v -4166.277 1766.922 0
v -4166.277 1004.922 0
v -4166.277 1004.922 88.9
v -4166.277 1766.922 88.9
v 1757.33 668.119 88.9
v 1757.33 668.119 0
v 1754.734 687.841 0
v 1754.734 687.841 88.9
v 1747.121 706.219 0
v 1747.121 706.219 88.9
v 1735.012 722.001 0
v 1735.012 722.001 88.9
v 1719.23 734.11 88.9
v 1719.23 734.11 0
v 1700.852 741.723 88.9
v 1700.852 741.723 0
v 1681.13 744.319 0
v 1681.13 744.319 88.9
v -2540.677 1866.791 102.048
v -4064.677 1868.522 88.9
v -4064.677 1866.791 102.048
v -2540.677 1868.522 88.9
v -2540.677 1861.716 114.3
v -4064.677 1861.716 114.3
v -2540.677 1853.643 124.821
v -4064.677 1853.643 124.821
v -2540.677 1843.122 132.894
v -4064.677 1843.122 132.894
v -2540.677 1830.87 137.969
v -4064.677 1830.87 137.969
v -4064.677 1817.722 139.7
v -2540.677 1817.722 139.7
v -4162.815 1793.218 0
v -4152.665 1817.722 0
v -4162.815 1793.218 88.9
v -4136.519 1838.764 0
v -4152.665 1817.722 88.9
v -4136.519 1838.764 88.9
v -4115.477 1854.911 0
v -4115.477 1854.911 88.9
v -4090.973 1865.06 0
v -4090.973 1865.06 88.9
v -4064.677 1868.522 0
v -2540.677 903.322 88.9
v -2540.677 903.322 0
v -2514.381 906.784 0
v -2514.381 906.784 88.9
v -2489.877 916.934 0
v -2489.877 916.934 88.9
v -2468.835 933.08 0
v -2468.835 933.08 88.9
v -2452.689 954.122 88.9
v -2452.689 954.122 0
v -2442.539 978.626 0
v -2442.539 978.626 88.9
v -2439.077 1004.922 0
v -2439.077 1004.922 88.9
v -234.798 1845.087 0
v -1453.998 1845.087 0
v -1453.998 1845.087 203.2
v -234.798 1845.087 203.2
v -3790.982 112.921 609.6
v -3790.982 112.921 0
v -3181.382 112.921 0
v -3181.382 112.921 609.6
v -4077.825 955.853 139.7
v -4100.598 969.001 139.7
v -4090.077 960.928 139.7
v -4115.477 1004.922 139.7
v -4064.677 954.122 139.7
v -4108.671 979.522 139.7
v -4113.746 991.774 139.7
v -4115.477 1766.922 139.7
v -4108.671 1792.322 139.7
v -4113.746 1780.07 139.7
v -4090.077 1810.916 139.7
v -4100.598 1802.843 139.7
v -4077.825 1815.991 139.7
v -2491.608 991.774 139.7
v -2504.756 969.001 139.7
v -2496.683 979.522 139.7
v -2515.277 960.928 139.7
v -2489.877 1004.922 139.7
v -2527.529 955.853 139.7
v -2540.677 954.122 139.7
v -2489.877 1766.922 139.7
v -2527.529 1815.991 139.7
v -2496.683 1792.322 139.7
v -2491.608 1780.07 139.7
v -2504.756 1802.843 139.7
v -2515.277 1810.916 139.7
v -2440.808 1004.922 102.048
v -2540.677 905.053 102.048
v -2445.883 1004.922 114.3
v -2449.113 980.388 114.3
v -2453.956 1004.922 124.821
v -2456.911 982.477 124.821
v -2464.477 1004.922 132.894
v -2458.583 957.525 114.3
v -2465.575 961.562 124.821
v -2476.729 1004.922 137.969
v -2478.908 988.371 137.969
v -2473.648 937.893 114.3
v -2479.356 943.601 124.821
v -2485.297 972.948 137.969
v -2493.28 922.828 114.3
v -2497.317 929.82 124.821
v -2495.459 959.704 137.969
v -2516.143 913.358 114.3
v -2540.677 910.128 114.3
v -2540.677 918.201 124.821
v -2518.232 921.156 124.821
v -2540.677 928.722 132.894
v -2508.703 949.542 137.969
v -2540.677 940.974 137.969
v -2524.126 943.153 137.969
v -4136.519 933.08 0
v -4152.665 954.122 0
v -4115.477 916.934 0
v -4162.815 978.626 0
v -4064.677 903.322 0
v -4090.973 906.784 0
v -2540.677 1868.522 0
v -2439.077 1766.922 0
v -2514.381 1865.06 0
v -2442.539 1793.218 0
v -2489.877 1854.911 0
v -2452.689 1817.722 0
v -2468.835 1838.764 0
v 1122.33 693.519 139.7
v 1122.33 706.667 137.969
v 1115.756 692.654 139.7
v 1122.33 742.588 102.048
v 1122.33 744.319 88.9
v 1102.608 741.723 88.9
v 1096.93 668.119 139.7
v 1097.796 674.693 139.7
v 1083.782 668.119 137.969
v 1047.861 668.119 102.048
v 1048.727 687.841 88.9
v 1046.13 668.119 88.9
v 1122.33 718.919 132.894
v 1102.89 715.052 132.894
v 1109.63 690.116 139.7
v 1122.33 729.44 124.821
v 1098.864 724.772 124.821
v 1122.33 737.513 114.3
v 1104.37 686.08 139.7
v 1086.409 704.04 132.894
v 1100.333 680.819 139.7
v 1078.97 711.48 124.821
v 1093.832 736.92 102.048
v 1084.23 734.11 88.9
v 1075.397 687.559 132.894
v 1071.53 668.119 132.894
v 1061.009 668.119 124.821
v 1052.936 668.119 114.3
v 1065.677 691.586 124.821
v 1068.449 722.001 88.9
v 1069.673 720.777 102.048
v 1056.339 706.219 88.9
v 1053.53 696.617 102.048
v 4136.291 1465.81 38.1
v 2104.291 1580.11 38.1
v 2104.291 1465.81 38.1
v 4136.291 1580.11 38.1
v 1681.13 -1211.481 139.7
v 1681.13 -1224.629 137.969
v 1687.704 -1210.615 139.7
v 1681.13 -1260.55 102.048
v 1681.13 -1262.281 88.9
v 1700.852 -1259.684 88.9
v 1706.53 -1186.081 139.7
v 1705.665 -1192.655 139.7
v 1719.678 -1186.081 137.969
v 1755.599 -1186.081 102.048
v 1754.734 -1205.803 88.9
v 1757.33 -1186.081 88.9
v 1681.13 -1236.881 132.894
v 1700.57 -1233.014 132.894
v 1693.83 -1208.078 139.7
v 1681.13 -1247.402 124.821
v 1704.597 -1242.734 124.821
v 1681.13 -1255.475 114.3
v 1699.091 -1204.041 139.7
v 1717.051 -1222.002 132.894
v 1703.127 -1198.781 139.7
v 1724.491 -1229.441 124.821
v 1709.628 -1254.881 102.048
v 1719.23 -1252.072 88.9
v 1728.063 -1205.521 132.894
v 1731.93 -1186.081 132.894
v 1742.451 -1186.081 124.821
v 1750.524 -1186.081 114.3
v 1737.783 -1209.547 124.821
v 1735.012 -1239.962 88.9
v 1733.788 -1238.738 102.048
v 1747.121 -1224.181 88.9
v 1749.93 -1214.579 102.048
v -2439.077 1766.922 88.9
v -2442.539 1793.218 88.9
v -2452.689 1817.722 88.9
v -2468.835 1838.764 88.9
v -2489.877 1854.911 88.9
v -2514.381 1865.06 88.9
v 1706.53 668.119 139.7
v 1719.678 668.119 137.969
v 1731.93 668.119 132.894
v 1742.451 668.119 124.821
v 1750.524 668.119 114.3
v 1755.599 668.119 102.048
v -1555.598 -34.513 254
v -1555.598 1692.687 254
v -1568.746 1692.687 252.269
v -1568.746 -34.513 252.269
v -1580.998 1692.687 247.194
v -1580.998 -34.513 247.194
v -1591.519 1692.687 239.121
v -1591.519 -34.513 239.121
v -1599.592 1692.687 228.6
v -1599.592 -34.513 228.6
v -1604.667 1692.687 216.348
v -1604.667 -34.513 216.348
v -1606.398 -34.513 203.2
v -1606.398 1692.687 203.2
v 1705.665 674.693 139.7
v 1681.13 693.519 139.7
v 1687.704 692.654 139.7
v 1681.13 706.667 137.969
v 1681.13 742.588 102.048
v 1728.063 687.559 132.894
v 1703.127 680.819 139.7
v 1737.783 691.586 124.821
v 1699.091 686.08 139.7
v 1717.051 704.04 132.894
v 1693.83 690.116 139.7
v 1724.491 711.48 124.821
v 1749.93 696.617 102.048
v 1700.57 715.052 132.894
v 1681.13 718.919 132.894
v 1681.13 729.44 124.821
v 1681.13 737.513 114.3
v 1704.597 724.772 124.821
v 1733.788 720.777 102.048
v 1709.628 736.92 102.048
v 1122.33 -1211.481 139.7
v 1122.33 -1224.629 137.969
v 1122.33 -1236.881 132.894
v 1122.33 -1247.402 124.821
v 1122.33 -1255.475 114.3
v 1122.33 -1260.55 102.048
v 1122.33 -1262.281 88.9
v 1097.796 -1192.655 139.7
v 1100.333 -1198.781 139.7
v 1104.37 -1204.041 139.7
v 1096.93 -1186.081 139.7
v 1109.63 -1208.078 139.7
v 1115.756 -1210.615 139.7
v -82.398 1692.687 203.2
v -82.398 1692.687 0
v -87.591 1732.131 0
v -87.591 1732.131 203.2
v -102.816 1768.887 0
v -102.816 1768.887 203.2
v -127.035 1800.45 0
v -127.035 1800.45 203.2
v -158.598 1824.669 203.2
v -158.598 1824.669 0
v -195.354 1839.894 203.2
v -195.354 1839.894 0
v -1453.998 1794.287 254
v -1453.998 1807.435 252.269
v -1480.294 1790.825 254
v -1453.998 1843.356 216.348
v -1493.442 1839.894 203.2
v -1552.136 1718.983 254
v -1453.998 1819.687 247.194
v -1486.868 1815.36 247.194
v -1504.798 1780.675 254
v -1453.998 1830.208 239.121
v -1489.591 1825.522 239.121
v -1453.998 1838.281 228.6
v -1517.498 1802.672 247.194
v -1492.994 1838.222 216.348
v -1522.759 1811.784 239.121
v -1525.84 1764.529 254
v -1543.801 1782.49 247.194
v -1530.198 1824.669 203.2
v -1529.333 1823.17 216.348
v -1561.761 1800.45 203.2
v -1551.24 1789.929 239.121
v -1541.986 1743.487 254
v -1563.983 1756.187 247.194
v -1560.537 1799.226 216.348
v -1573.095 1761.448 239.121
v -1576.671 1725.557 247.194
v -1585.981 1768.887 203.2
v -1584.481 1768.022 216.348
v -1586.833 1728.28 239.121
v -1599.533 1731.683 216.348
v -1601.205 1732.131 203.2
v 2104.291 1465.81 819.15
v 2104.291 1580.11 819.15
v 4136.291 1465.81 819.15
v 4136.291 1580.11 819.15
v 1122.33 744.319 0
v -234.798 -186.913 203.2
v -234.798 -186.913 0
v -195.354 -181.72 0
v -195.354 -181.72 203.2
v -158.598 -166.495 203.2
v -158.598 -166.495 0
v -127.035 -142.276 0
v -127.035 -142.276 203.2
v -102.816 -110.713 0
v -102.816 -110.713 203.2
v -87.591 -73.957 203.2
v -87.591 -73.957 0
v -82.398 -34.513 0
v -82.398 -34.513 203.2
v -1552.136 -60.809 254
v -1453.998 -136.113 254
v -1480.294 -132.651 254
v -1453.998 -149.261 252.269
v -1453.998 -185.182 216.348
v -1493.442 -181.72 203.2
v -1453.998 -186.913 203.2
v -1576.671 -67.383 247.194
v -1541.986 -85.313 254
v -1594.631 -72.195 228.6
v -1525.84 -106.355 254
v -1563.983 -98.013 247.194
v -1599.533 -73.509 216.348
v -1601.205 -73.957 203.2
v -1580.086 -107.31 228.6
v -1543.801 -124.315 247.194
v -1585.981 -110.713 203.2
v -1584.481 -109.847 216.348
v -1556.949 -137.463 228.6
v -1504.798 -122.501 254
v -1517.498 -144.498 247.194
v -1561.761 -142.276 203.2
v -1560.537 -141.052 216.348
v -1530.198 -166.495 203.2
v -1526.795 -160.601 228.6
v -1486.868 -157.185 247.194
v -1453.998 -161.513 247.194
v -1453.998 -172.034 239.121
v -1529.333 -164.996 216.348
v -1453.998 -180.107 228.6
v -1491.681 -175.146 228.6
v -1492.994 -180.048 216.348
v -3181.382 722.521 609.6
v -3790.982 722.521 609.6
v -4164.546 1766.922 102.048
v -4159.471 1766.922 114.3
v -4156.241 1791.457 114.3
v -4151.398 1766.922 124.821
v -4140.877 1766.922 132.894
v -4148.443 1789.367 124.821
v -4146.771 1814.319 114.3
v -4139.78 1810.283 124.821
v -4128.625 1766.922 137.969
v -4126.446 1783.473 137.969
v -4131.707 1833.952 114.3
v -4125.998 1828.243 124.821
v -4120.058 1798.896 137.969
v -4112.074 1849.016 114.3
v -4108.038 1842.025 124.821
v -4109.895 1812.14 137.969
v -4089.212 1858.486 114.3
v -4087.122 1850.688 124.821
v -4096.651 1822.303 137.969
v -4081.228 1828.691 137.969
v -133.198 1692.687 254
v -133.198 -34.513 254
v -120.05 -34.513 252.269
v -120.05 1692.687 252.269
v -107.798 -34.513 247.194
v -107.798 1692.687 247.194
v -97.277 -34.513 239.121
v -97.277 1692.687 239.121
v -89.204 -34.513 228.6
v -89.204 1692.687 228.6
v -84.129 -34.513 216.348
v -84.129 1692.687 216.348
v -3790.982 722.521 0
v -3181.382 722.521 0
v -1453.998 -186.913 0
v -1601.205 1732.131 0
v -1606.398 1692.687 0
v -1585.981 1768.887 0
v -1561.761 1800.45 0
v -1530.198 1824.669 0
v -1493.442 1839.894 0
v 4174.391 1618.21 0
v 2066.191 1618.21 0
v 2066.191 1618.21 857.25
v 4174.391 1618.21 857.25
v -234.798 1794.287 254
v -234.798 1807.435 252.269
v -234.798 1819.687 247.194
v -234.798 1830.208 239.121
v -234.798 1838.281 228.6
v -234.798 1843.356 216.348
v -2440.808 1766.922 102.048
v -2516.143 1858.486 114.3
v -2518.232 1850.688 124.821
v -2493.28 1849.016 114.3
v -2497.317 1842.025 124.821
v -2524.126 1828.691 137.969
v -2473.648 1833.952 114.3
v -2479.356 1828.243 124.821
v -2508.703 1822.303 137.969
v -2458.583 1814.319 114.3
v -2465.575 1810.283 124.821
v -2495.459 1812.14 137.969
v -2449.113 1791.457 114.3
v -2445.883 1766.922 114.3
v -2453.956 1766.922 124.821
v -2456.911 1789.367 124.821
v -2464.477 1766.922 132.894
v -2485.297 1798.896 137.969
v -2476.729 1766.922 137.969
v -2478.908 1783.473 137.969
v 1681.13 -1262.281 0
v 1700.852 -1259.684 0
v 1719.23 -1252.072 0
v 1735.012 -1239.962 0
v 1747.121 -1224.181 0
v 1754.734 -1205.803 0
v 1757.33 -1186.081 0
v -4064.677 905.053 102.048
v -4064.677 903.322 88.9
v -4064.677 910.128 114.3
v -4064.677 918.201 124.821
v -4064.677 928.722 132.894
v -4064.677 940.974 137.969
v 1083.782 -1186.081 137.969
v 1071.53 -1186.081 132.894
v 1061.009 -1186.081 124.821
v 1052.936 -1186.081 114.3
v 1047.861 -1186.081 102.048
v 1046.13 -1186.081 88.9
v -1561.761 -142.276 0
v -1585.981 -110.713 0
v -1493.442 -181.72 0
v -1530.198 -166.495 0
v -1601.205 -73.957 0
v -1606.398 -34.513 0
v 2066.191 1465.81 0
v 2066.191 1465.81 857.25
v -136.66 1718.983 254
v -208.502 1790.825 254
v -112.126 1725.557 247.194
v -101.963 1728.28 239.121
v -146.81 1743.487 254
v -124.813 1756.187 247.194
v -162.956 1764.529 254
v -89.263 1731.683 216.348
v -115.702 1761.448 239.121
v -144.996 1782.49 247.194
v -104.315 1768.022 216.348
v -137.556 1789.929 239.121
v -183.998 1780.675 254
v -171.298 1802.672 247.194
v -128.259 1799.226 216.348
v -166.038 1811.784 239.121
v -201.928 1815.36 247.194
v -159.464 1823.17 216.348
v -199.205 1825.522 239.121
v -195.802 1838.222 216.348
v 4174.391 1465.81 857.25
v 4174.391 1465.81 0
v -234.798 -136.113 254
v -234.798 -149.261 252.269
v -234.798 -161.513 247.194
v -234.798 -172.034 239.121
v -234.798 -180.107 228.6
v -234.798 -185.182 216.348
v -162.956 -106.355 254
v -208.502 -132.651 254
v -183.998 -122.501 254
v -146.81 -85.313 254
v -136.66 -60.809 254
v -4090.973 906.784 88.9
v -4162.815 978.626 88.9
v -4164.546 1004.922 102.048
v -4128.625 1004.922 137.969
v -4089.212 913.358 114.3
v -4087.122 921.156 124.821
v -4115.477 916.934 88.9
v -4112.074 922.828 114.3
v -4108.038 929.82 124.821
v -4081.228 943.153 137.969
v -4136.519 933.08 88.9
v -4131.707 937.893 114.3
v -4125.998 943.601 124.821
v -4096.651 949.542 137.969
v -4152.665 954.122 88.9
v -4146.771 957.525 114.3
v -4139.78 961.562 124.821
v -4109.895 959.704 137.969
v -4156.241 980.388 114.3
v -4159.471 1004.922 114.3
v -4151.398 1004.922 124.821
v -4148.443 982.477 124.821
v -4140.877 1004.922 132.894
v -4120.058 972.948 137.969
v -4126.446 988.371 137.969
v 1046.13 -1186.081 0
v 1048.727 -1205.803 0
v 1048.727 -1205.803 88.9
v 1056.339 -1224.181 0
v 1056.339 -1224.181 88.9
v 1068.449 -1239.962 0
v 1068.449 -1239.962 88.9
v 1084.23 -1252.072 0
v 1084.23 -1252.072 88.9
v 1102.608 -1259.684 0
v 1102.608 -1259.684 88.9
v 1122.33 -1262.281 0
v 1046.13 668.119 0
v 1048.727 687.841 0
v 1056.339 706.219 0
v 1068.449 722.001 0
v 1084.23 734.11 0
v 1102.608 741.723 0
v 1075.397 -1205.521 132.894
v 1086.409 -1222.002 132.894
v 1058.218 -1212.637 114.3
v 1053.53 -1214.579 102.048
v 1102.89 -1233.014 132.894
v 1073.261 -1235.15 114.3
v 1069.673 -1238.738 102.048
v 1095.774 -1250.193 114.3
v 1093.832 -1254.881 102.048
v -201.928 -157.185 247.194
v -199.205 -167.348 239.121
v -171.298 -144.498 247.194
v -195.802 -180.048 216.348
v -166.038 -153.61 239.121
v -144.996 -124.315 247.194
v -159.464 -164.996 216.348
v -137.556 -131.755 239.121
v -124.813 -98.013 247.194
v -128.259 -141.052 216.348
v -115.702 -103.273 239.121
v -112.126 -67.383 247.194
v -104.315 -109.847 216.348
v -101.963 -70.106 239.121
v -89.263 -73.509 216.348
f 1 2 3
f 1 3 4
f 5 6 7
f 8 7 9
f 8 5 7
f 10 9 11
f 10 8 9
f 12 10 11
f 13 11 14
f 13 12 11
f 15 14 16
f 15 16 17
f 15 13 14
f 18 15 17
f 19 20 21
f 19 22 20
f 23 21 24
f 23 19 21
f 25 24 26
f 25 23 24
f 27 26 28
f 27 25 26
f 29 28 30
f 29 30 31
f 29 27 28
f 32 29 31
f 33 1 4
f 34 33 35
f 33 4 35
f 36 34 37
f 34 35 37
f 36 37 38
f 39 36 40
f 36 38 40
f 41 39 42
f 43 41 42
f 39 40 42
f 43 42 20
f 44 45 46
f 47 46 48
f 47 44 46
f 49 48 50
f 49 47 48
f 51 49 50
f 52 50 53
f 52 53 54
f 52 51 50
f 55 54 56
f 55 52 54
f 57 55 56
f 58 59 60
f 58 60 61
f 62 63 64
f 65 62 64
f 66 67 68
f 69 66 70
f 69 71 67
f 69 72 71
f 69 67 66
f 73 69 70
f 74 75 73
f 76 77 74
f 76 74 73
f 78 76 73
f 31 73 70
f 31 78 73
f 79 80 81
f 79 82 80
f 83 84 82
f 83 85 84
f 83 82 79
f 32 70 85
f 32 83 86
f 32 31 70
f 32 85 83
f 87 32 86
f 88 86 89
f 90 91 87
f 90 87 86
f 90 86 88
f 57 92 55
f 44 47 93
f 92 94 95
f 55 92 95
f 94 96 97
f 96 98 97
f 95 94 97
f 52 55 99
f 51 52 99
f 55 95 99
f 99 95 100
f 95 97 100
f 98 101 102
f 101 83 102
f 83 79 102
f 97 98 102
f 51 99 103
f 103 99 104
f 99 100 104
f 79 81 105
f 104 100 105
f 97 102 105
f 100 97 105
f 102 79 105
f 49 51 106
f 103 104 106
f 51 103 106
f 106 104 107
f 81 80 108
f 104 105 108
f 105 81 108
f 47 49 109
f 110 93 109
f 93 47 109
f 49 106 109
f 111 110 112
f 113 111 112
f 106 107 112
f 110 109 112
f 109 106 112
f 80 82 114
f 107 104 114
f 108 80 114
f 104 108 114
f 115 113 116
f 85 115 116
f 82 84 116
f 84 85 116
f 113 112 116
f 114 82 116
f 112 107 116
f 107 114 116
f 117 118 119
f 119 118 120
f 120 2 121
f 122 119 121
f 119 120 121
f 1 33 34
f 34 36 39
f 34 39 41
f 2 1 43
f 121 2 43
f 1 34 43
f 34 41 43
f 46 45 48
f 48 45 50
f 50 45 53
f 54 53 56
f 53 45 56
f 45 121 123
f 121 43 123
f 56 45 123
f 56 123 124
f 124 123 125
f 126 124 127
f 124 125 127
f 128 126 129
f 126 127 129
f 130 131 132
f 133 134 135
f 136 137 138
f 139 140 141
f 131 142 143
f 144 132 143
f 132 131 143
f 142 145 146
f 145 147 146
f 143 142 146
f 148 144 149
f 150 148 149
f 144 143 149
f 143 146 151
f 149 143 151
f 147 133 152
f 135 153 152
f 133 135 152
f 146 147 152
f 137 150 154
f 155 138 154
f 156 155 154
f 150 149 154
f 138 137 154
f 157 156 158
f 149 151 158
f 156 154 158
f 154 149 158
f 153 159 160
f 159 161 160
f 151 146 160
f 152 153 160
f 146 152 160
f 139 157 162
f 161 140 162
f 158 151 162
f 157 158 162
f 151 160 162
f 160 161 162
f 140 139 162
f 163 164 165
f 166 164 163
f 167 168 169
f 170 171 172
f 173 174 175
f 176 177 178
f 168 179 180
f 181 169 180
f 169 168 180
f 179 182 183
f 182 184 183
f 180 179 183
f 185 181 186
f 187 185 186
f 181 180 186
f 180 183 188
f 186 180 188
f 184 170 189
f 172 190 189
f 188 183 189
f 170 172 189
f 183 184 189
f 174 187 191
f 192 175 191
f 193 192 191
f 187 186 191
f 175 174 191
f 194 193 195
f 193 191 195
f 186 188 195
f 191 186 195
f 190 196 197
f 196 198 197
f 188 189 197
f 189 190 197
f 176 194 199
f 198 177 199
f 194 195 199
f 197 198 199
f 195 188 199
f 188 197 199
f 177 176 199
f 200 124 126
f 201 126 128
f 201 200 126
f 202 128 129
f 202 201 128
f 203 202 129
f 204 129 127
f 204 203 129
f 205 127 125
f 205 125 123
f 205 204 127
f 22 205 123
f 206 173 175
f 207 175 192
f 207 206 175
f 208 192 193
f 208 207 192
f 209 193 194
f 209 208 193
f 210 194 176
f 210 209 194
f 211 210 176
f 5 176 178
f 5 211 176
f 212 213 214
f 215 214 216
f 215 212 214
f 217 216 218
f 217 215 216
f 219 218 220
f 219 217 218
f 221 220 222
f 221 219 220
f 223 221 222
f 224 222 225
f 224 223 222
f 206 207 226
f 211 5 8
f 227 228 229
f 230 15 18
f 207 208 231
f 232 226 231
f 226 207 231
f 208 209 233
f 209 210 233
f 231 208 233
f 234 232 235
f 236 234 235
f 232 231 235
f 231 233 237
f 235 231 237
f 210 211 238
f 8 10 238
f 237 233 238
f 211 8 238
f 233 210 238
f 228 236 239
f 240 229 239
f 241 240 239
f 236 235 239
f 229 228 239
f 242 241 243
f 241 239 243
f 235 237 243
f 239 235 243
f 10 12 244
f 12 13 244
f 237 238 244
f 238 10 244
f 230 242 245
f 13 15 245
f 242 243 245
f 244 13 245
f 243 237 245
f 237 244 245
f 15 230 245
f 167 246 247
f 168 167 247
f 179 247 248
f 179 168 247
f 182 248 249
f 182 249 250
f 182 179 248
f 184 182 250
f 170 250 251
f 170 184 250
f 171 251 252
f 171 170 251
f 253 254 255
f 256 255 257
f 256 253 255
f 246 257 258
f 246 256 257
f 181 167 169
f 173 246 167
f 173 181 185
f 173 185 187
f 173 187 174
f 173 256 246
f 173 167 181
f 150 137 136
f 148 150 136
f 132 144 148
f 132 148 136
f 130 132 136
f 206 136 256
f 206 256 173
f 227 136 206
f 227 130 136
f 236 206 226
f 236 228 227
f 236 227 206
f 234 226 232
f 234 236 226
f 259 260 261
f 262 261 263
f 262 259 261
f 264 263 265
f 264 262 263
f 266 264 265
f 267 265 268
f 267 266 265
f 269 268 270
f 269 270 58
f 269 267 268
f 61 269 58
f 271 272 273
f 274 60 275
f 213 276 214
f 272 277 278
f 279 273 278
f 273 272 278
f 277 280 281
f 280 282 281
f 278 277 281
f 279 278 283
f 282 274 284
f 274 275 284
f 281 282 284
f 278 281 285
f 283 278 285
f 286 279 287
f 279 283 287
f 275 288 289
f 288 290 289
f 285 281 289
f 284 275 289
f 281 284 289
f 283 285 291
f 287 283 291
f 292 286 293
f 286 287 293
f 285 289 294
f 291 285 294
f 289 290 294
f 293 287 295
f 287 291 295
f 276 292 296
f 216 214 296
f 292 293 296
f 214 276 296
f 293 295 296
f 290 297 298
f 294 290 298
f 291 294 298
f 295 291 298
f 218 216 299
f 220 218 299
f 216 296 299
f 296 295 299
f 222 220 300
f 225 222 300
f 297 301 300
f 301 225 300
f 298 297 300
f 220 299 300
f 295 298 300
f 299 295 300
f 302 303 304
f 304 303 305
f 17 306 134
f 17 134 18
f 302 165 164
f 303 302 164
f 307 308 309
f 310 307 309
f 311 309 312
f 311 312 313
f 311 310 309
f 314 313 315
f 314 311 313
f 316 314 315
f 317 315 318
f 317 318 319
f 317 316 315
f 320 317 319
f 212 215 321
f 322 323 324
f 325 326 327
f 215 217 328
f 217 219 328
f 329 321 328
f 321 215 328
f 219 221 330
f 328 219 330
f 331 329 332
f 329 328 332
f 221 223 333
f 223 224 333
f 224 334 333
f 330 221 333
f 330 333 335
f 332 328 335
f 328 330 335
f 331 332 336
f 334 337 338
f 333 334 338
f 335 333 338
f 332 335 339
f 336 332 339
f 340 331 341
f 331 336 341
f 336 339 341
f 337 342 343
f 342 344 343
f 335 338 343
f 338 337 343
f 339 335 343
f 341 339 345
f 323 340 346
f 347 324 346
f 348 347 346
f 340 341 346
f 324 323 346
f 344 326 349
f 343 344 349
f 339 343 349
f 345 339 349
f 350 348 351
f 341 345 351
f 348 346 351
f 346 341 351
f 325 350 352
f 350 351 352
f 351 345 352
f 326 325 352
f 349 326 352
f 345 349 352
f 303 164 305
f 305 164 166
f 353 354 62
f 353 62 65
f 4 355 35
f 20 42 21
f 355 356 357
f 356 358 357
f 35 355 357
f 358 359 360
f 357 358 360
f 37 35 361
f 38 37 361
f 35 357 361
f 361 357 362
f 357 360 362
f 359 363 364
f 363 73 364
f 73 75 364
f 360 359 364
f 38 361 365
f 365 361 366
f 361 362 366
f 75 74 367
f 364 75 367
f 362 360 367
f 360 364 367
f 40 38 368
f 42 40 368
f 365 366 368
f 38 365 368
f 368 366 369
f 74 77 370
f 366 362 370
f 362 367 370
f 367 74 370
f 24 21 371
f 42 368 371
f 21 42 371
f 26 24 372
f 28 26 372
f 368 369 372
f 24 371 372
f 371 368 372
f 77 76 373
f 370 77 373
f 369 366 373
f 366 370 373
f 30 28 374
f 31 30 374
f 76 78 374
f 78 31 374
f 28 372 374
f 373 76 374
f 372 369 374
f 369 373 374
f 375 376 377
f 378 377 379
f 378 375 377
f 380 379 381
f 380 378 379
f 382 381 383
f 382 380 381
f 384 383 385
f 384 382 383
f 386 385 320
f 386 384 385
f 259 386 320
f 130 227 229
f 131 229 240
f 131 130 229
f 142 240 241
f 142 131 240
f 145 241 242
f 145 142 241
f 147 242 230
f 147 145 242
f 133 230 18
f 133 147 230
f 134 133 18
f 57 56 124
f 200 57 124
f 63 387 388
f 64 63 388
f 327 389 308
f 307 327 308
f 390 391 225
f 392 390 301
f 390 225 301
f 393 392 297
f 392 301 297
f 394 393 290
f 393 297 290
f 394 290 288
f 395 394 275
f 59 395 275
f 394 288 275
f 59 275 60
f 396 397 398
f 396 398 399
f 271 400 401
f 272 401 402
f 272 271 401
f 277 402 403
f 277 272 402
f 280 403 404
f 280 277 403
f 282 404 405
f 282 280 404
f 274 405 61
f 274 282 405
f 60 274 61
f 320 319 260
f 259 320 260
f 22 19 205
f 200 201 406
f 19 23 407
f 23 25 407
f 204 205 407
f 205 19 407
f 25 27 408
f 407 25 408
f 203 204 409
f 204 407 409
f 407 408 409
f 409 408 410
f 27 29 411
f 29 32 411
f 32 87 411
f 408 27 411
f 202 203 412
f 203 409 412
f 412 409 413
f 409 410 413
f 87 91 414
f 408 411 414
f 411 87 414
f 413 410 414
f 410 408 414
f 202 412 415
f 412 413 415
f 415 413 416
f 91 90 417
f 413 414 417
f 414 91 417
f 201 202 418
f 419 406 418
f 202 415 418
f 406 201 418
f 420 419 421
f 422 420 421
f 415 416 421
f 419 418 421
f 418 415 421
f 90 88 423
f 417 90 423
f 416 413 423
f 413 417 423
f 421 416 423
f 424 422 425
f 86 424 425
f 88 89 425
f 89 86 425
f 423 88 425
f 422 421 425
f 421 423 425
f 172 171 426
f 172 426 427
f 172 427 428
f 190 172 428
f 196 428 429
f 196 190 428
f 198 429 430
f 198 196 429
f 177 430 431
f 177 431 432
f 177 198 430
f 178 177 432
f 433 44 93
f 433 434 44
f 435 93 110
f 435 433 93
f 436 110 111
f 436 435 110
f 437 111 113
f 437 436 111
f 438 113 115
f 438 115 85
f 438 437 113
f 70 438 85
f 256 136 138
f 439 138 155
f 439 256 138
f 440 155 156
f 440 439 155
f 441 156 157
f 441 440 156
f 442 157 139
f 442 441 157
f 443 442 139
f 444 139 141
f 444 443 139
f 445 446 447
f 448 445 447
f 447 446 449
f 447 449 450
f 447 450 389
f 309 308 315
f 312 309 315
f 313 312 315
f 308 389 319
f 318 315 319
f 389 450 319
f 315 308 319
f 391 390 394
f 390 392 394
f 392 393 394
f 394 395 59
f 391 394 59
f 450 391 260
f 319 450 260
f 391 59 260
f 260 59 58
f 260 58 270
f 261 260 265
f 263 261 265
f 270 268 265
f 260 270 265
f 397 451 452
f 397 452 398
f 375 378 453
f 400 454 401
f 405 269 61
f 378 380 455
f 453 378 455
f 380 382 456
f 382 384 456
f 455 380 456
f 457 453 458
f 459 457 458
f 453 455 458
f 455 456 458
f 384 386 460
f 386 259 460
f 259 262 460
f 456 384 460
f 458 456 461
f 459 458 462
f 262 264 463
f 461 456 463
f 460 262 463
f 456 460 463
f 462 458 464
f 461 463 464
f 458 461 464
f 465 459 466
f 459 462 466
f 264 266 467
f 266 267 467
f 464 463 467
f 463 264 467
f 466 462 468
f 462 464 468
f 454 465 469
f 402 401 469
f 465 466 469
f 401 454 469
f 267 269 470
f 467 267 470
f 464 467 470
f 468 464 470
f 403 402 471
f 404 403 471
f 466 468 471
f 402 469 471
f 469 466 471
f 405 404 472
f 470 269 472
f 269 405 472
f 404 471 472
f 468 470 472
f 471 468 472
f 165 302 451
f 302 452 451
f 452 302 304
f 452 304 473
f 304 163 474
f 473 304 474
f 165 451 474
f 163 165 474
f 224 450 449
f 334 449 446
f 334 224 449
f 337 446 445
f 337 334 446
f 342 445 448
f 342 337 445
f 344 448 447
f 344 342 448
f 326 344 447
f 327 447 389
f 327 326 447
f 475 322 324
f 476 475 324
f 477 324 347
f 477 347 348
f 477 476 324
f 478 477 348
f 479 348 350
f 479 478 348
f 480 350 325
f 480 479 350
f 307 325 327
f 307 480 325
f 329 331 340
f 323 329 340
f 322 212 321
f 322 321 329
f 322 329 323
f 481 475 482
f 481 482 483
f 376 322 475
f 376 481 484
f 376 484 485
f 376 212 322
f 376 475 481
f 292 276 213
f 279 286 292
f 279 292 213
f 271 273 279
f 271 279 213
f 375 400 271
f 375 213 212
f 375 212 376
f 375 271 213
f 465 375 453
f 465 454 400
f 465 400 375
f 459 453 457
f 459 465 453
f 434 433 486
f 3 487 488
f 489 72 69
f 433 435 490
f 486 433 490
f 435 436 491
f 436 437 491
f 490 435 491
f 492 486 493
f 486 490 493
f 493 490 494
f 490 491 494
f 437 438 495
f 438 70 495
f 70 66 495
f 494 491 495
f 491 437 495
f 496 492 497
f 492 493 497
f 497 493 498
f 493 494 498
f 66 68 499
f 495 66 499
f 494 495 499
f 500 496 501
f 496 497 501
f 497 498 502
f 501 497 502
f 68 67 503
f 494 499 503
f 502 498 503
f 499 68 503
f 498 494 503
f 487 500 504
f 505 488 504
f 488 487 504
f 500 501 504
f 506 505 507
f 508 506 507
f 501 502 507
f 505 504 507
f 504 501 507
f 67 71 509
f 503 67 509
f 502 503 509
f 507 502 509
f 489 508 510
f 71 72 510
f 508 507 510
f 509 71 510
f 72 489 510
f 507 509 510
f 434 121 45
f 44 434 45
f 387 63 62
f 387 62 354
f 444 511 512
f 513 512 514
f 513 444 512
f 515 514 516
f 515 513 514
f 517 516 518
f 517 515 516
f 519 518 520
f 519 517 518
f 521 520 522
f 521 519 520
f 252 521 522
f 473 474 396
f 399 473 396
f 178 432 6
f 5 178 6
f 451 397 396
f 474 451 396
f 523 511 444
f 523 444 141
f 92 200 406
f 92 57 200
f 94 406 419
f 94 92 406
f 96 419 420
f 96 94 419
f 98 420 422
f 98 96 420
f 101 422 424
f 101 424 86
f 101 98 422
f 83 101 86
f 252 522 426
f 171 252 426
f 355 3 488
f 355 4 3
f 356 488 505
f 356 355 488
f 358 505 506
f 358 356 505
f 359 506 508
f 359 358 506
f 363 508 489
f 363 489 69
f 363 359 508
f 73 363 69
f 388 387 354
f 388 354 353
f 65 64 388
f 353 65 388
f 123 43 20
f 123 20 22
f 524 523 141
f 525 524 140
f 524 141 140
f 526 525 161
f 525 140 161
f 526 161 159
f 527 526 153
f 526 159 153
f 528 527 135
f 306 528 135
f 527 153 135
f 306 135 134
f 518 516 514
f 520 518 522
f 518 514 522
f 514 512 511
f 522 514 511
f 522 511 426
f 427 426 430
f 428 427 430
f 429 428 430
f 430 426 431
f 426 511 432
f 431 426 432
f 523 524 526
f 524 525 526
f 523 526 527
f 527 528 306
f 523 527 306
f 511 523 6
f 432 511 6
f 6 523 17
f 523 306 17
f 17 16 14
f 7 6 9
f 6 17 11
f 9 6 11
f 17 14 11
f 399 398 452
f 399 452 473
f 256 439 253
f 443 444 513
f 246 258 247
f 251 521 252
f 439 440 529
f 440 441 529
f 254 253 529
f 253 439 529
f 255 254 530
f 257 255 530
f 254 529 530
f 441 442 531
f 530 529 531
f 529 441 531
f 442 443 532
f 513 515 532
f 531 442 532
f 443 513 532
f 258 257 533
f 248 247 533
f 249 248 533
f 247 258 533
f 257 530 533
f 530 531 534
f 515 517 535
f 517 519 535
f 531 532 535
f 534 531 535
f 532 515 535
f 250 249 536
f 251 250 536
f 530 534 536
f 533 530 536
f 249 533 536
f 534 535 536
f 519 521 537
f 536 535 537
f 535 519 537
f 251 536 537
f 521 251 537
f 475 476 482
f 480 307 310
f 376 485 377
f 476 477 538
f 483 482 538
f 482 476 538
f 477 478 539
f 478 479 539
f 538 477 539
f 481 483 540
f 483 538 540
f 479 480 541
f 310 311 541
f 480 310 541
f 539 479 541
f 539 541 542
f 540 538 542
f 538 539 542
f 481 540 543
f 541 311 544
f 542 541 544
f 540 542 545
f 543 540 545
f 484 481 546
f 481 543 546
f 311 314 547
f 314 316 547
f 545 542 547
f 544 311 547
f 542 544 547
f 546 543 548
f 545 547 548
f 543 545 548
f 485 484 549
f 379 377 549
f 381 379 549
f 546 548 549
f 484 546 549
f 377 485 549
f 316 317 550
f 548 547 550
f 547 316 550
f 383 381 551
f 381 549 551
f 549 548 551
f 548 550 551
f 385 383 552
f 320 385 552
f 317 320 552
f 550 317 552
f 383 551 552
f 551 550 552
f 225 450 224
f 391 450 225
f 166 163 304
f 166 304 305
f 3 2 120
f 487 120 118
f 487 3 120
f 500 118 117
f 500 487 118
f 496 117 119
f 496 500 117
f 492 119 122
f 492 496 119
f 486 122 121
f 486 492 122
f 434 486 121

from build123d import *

# Parameters (mm, degrees)
F0_W      = 1524
F0_H      = 2032
F1_DEPTH  = 254
F2_R      = 152.4
F3_R      = 50.8
F4_W      = 1727.2
F4_H      = 965.2
F5_DEPTH  = 139.7
F6_R      = 101.6
F7_R      = 50.8
F8_W      = 609.6
F8_H      = 609.6
F9_DEPTH  = 609.6
F10_W     = 711.2
F10_H     = 2006.6
F11_DEPTH = 139.7
F12_R     = 76.2
F13_R     = 50.8
F14_W     = 2108.2
F14_H     = 152.4
F15_DEPTH = 857.25
F16_T     = -38.1


with BuildPart() as f1:
    # F0 (on Top) → F1 (new body)
    with BuildSketch(Plane.XY):
        with Locations((-844.3982357979, 829.087195158)):
            Rectangle(F0_W, F0_H)
    extrude(amount=F1_DEPTH)

    # F2
    f2_edges = [f1.edges().sort_by_distance(p)[0] for p in [
        (-82.398236, -186.912805, 127),
        (-1606.398236, -186.912805, 127),
        (-82.398236, 1845.087195, 127),
        (-1606.398236, 1845.087195, 127),
    ]]
    fillet(f2_edges, radius=F2_R)

    # F3
    f3_edges = [f1.edges().sort_by_distance(p)[0] for p in [
        (-844.398236, -186.912805, 254),
        (-127.035162, -142.275878, 254),
        (-82.398236, 829.087195, 254),
        (-127.035162, 1800.450269, 254),
        (-844.398236, 1845.087195, 254),
        (-1561.761309, 1800.450269, 254),
        (-1606.398236, 829.087195, 254),
        (-1561.761309, -142.275878, 254),
    ]]
    fillet(f3_edges, radius=F3_R)


with BuildPart() as f5:
    # F4 (on Top) → F5 (new body)
    with BuildSketch(Plane.XY):
        with Locations((-3302.6771389008, 1385.9223986626)):
            Rectangle(F4_W, F4_H)
    extrude(amount=F5_DEPTH)

    # F6
    f6_edges = [f5.edges().sort_by_distance(p)[0] for p in [
        (-4166.277139, 903.322399, 69.85),
        (-2439.077139, 903.322399, 69.85),
        (-2439.077139, 1868.522399, 69.85),
        (-4166.277139, 1868.522399, 69.85),
    ]]
    fillet(f6_edges, radius=F6_R)

    # F7
    f7_edges = [f5.edges().sort_by_distance(p)[0] for p in [
        (-4166.277139, 1385.922399, 139.7),
        (-4136.519188, 1838.764448, 139.7),
        (-3302.677139, 1868.522399, 139.7),
        (-2468.83509, 1838.764448, 139.7),
        (-2439.077139, 1385.922399, 139.7),
        (-2468.83509, 933.08035, 139.7),
        (-3302.677139, 903.322399, 139.7),
        (-4136.519188, 933.08035, 139.7),
    ]]
    fillet(f7_edges, radius=F7_R)


with BuildPart() as f9:
    # F8 (on Top) → F9 (new body)
    with BuildSketch(Plane.XY):
        with Locations((-3486.1819408417, 417.7207536578)):
            Rectangle(F8_W, F8_H)
    extrude(amount=F9_DEPTH)


with BuildPart() as f11:
    # F10 (on Top) → F11 (new body)
    with BuildSketch(Plane.XY):
        with Locations((1401.7300600052, -258.9808218002)):
            Rectangle(F10_W, F10_H)
    extrude(amount=F11_DEPTH)

    # F12
    f12_edges = [f11.edges().sort_by_distance(p)[0] for p in [
        (1046.13006, -1262.280822, 69.85),
        (1757.33006, -1262.280822, 69.85),
        (1757.33006, 744.319178, 69.85),
        (1046.13006, 744.319178, 69.85),
    ]]
    fillet(f12_edges, radius=F12_R)

    # F13
    f13_edges = [f11.edges().sort_by_distance(p)[0] for p in [
        (1401.73006, -1262.280822, 139.7),
        (1735.011597, -1239.962359, 139.7),
        (1757.33006, -258.980822, 139.7),
        (1735.011597, 722.000715, 139.7),
        (1401.73006, 744.319178, 139.7),
        (1068.448523, 722.000715, 139.7),
        (1046.13006, -258.980822, 139.7),
        (1068.448523, -1239.962359, 139.7),
    ]]
    fillet(f13_edges, radius=F13_R)


with BuildPart() as f15:
    # F14 (on Top) → F15 (new body)
    with BuildSketch(Plane.XY):
        with Locations((3120.2912612915, 1542.010418129)):
            Rectangle(F14_W, F14_H)
    extrude(amount=F15_DEPTH)

    # F16
    f16_openings = [f15.faces().sort_by_distance(p)[0] for p in [
        (3120.291261, 1465.810418, 428.625),
    ]]
    offset(amount=F16_T, openings=f16_openings)


solid = Compound([f1.part, f5.part, f9.part, f11.part, f15.part])
